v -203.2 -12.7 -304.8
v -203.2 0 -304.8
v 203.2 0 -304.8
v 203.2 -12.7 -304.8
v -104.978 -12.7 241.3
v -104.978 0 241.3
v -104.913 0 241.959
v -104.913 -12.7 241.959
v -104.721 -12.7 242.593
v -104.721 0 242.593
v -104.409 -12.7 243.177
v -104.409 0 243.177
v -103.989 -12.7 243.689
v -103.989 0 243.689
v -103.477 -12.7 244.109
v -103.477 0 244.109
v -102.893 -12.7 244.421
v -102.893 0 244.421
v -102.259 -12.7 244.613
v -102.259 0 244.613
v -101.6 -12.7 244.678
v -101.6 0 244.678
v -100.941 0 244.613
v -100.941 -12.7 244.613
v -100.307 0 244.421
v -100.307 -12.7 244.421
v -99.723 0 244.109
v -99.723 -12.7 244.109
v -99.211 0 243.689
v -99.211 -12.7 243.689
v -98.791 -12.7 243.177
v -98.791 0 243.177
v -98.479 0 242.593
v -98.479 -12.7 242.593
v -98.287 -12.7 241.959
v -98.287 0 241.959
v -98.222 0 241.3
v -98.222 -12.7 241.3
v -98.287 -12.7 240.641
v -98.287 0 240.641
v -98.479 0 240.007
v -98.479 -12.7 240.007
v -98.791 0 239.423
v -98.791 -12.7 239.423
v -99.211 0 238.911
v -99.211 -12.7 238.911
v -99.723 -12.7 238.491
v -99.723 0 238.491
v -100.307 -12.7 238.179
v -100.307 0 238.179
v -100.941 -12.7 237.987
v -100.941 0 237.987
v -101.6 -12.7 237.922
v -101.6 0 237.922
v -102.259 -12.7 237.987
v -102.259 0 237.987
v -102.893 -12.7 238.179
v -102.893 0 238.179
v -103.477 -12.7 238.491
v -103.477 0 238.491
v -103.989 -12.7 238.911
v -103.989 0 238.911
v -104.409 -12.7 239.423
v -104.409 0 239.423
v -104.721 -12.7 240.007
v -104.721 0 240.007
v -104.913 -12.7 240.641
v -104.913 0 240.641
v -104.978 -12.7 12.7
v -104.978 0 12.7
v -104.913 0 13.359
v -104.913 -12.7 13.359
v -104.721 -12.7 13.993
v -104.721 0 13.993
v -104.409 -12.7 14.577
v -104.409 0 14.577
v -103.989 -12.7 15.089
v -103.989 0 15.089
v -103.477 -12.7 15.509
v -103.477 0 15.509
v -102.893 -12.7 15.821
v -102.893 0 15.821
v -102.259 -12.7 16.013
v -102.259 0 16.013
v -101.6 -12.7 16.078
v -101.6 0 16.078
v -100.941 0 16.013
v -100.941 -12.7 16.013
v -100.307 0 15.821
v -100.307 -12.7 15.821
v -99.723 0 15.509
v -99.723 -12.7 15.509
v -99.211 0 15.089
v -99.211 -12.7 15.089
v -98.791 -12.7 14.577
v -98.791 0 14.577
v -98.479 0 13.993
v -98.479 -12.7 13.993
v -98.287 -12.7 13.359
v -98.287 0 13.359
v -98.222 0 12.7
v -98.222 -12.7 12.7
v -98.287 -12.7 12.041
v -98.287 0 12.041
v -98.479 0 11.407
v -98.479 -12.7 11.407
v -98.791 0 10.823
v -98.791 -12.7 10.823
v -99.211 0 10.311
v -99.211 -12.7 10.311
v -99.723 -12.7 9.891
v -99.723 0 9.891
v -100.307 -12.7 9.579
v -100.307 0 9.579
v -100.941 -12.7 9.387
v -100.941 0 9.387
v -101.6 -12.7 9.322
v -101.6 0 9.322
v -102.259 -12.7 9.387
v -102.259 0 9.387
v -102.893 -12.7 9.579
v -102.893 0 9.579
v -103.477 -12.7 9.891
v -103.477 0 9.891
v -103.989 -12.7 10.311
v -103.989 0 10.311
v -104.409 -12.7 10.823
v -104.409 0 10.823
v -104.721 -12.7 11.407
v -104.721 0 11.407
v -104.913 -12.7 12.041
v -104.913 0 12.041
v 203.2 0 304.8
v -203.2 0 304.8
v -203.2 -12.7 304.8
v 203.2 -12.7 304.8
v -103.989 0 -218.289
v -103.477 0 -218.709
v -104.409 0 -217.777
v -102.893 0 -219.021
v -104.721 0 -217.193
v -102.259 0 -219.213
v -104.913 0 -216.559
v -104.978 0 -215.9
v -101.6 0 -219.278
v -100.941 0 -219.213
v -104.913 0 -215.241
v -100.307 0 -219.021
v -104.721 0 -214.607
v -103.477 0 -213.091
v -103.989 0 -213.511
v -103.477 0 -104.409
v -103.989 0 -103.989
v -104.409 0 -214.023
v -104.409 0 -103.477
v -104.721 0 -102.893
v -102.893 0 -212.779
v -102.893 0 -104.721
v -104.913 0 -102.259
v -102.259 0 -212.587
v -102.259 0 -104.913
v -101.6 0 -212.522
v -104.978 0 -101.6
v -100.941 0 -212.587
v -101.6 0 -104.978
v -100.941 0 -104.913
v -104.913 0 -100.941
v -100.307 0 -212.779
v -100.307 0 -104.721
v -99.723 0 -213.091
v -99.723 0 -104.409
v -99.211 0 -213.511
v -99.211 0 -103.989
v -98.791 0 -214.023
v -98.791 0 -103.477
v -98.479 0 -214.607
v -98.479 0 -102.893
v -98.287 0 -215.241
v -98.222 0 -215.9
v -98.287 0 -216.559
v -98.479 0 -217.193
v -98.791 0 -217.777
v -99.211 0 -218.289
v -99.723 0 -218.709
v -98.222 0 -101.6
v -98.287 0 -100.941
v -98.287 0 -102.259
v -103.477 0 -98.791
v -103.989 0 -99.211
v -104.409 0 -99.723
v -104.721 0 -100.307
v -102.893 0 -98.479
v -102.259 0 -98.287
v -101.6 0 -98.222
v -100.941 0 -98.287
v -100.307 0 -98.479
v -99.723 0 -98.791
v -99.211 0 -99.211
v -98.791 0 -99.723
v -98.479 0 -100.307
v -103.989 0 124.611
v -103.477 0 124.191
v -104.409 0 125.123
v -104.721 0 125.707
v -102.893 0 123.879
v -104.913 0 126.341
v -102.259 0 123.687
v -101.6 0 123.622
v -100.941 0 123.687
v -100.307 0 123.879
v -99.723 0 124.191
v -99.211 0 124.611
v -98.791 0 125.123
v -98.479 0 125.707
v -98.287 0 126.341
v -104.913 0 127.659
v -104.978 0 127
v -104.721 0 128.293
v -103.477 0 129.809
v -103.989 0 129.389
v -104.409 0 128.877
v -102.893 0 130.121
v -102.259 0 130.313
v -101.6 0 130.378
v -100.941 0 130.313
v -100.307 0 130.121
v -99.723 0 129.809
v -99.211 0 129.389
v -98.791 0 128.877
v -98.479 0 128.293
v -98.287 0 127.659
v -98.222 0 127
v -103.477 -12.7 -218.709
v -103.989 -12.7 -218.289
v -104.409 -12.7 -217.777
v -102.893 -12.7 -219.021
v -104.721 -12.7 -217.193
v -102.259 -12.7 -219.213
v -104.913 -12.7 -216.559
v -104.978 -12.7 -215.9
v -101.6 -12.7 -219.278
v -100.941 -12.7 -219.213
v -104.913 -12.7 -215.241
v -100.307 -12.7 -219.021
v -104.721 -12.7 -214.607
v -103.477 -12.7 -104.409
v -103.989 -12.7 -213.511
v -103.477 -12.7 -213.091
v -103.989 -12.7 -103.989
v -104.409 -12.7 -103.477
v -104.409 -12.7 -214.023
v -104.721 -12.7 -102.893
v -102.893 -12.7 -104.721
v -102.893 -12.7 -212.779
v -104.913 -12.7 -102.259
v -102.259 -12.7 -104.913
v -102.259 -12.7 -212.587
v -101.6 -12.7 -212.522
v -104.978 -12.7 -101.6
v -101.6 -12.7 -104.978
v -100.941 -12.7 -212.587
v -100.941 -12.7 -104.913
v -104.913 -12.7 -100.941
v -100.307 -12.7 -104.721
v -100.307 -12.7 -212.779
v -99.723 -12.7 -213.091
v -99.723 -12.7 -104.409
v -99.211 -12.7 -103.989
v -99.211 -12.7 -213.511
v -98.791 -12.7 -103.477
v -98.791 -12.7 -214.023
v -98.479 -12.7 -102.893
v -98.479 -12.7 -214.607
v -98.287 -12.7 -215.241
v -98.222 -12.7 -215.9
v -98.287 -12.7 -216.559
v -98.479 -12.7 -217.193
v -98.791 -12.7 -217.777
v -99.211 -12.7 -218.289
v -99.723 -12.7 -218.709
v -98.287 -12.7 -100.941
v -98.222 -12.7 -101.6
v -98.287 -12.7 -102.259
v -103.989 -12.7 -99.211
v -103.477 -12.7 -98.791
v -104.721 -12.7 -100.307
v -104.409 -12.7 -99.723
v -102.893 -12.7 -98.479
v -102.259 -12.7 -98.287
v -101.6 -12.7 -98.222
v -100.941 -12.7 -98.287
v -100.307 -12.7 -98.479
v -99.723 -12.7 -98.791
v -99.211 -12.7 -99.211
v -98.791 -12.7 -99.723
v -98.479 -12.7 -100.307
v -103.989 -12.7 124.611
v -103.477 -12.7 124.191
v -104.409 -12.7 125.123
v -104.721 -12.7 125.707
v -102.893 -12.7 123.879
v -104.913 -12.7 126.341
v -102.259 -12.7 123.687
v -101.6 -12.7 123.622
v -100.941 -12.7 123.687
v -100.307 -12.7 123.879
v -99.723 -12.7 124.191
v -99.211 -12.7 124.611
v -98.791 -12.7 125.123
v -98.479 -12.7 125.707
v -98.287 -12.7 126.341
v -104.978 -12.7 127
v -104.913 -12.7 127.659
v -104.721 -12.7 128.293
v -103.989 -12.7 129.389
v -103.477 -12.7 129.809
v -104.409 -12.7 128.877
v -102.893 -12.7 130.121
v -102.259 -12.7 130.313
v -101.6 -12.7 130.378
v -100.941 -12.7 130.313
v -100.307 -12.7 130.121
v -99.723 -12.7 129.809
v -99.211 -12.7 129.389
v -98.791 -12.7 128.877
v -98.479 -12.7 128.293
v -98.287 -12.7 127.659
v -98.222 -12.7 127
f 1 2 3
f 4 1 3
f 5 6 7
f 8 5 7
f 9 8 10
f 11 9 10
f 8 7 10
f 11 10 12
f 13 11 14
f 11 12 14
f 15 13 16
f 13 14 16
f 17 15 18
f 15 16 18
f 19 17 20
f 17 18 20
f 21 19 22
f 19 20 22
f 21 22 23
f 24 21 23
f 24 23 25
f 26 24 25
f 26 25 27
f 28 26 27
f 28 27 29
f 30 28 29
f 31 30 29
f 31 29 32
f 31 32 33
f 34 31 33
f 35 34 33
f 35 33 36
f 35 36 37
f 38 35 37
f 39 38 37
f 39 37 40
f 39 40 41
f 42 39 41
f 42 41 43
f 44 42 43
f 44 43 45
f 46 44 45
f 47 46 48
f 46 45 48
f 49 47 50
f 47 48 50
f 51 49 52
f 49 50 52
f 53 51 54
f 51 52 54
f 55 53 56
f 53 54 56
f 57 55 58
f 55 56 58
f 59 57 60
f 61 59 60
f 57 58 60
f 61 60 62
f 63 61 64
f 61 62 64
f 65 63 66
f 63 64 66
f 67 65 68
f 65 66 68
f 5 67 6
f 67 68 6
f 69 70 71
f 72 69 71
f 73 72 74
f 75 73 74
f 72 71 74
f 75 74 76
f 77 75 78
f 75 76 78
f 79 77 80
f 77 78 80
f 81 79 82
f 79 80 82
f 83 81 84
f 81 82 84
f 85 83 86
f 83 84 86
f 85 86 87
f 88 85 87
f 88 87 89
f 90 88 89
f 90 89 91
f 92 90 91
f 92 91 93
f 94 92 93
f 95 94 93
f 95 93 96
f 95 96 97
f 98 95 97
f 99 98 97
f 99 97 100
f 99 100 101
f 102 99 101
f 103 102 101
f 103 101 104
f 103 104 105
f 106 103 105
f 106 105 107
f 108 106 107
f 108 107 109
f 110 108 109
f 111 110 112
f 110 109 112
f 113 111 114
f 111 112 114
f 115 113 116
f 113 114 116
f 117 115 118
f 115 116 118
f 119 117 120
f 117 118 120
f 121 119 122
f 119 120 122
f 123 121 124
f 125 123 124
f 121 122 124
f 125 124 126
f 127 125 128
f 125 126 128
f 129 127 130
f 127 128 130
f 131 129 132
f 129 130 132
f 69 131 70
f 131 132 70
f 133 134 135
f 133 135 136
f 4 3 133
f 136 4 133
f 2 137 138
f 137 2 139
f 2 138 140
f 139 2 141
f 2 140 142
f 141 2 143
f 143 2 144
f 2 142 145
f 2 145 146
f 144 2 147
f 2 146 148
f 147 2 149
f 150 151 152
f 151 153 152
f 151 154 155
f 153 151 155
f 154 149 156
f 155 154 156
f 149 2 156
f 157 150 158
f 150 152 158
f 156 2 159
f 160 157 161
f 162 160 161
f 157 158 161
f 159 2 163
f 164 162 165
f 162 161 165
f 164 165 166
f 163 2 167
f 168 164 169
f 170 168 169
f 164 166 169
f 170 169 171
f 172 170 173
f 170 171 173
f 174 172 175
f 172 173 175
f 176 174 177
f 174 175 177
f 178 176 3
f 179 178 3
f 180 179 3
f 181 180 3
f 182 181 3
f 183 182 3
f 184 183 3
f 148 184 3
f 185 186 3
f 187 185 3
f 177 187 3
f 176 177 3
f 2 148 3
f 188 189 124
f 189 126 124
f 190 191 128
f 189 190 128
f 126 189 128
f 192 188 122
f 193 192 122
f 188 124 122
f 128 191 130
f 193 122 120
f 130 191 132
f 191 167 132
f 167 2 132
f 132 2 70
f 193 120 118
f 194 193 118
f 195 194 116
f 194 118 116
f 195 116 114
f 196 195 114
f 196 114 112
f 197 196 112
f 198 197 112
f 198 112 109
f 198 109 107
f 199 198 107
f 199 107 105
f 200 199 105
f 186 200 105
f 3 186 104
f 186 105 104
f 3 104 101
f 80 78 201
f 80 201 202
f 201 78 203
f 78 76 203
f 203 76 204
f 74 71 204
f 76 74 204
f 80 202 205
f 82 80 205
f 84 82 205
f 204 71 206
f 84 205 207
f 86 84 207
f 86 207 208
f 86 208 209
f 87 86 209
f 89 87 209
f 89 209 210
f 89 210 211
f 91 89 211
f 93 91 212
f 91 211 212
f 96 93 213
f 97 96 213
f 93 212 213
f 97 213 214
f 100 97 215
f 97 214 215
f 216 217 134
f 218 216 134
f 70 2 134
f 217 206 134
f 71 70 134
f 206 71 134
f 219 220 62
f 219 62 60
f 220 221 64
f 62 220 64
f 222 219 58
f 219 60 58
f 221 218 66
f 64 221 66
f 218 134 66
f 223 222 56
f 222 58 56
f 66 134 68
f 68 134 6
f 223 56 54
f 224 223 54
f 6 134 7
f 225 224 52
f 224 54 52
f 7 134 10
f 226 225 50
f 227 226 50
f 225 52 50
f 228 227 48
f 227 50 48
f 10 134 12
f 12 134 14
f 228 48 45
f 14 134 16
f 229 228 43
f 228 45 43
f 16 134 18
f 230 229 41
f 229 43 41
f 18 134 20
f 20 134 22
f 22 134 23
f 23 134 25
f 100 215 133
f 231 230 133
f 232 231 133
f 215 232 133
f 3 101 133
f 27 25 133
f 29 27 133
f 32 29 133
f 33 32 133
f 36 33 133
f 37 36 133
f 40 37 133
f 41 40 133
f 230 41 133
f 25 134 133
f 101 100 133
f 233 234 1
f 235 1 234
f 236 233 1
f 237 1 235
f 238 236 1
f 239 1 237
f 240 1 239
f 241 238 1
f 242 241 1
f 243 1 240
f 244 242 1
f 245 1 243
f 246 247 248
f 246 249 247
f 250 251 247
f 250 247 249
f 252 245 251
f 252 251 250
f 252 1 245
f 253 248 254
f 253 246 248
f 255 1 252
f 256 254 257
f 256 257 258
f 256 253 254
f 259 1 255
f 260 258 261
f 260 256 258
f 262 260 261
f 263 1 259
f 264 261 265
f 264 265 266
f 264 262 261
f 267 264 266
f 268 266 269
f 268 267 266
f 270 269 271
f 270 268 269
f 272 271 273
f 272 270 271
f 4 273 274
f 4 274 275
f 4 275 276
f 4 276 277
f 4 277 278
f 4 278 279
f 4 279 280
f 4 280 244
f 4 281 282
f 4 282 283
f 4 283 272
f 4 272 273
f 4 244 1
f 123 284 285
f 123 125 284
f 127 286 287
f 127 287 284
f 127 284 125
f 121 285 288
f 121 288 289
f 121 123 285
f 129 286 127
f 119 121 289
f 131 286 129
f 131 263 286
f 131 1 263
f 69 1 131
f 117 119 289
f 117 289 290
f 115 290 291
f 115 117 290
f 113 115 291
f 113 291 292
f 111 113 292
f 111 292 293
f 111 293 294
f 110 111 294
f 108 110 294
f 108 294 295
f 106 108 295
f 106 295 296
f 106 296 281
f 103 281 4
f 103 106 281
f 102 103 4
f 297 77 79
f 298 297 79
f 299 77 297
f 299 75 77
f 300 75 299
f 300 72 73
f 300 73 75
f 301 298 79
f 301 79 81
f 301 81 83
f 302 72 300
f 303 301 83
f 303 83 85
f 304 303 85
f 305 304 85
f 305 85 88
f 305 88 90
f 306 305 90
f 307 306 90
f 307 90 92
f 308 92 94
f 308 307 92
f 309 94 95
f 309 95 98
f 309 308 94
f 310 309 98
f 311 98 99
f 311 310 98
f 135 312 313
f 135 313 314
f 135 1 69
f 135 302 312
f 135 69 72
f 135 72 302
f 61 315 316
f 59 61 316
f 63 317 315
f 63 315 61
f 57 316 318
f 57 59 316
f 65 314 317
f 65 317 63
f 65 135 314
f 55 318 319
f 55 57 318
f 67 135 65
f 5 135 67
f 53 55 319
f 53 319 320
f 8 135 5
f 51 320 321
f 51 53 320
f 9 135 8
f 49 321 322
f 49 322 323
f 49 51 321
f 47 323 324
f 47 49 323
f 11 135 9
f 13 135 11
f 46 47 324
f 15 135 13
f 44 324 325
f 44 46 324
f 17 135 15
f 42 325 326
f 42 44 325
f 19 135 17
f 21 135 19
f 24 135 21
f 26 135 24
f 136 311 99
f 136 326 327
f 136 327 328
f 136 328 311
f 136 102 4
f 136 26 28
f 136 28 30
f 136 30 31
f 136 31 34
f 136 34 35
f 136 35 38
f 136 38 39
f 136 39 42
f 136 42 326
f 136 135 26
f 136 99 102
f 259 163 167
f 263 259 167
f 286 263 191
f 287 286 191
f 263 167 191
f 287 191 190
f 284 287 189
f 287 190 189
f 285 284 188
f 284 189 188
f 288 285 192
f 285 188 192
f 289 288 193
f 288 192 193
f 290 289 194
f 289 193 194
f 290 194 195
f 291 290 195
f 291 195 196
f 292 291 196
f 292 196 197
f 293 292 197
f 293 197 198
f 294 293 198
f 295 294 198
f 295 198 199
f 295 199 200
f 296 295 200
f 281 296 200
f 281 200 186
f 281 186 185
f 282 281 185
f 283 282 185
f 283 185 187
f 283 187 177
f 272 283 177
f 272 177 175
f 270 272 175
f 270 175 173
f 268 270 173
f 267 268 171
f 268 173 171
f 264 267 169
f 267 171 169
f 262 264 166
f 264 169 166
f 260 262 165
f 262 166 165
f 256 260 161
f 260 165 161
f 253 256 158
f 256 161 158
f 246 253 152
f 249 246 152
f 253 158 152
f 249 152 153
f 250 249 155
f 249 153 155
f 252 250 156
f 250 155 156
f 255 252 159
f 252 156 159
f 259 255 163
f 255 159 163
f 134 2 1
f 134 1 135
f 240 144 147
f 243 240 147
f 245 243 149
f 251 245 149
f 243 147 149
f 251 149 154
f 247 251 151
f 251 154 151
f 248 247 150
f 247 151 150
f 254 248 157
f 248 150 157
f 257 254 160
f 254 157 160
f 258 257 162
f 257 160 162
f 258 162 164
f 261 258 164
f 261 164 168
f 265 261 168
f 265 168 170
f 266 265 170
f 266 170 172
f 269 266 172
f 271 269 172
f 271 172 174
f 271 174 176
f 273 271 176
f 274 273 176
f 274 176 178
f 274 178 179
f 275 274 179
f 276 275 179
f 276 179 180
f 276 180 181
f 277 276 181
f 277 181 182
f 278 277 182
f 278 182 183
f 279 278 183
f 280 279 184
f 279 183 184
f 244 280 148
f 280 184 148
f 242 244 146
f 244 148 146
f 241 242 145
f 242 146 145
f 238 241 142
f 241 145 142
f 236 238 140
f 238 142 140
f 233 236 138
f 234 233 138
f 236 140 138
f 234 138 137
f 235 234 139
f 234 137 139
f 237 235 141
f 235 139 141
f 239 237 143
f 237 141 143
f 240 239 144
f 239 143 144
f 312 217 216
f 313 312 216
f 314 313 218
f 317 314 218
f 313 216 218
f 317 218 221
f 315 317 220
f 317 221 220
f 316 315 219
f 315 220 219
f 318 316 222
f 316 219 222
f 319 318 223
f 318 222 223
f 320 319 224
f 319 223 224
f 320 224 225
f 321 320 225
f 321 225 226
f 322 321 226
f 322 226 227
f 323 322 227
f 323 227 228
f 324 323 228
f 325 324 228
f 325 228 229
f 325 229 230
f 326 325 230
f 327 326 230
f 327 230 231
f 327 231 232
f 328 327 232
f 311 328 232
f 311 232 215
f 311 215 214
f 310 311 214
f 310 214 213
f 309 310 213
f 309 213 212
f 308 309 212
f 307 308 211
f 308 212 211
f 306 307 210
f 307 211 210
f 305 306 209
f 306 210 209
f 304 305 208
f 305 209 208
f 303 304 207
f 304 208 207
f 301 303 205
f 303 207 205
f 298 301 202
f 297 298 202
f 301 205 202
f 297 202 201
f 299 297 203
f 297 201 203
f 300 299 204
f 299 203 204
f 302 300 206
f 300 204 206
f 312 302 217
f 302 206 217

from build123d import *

# Parameters (mm, degrees)
F0_W     = 406.4
F0_H     = 609.6
F1_DEPTH = 12.7
F3_D     = 6.7564


with BuildPart() as f1:
    # F0 (on Front) → F1 (new body)
    with BuildSketch(Plane.XZ):
        Rectangle(F0_W, F0_H)
    extrude(amount=F1_DEPTH)

    # F3 (through all)
    with Locations(Plane.XZ.offset(12.7)):
        with Locations((-101.6, 241.3), (-101.6, 127), (-101.6, 12.7), (-101.6, -101.6), (-101.6, -215.9)):
            Hole(F3_D / 2)


solid = f1.part
